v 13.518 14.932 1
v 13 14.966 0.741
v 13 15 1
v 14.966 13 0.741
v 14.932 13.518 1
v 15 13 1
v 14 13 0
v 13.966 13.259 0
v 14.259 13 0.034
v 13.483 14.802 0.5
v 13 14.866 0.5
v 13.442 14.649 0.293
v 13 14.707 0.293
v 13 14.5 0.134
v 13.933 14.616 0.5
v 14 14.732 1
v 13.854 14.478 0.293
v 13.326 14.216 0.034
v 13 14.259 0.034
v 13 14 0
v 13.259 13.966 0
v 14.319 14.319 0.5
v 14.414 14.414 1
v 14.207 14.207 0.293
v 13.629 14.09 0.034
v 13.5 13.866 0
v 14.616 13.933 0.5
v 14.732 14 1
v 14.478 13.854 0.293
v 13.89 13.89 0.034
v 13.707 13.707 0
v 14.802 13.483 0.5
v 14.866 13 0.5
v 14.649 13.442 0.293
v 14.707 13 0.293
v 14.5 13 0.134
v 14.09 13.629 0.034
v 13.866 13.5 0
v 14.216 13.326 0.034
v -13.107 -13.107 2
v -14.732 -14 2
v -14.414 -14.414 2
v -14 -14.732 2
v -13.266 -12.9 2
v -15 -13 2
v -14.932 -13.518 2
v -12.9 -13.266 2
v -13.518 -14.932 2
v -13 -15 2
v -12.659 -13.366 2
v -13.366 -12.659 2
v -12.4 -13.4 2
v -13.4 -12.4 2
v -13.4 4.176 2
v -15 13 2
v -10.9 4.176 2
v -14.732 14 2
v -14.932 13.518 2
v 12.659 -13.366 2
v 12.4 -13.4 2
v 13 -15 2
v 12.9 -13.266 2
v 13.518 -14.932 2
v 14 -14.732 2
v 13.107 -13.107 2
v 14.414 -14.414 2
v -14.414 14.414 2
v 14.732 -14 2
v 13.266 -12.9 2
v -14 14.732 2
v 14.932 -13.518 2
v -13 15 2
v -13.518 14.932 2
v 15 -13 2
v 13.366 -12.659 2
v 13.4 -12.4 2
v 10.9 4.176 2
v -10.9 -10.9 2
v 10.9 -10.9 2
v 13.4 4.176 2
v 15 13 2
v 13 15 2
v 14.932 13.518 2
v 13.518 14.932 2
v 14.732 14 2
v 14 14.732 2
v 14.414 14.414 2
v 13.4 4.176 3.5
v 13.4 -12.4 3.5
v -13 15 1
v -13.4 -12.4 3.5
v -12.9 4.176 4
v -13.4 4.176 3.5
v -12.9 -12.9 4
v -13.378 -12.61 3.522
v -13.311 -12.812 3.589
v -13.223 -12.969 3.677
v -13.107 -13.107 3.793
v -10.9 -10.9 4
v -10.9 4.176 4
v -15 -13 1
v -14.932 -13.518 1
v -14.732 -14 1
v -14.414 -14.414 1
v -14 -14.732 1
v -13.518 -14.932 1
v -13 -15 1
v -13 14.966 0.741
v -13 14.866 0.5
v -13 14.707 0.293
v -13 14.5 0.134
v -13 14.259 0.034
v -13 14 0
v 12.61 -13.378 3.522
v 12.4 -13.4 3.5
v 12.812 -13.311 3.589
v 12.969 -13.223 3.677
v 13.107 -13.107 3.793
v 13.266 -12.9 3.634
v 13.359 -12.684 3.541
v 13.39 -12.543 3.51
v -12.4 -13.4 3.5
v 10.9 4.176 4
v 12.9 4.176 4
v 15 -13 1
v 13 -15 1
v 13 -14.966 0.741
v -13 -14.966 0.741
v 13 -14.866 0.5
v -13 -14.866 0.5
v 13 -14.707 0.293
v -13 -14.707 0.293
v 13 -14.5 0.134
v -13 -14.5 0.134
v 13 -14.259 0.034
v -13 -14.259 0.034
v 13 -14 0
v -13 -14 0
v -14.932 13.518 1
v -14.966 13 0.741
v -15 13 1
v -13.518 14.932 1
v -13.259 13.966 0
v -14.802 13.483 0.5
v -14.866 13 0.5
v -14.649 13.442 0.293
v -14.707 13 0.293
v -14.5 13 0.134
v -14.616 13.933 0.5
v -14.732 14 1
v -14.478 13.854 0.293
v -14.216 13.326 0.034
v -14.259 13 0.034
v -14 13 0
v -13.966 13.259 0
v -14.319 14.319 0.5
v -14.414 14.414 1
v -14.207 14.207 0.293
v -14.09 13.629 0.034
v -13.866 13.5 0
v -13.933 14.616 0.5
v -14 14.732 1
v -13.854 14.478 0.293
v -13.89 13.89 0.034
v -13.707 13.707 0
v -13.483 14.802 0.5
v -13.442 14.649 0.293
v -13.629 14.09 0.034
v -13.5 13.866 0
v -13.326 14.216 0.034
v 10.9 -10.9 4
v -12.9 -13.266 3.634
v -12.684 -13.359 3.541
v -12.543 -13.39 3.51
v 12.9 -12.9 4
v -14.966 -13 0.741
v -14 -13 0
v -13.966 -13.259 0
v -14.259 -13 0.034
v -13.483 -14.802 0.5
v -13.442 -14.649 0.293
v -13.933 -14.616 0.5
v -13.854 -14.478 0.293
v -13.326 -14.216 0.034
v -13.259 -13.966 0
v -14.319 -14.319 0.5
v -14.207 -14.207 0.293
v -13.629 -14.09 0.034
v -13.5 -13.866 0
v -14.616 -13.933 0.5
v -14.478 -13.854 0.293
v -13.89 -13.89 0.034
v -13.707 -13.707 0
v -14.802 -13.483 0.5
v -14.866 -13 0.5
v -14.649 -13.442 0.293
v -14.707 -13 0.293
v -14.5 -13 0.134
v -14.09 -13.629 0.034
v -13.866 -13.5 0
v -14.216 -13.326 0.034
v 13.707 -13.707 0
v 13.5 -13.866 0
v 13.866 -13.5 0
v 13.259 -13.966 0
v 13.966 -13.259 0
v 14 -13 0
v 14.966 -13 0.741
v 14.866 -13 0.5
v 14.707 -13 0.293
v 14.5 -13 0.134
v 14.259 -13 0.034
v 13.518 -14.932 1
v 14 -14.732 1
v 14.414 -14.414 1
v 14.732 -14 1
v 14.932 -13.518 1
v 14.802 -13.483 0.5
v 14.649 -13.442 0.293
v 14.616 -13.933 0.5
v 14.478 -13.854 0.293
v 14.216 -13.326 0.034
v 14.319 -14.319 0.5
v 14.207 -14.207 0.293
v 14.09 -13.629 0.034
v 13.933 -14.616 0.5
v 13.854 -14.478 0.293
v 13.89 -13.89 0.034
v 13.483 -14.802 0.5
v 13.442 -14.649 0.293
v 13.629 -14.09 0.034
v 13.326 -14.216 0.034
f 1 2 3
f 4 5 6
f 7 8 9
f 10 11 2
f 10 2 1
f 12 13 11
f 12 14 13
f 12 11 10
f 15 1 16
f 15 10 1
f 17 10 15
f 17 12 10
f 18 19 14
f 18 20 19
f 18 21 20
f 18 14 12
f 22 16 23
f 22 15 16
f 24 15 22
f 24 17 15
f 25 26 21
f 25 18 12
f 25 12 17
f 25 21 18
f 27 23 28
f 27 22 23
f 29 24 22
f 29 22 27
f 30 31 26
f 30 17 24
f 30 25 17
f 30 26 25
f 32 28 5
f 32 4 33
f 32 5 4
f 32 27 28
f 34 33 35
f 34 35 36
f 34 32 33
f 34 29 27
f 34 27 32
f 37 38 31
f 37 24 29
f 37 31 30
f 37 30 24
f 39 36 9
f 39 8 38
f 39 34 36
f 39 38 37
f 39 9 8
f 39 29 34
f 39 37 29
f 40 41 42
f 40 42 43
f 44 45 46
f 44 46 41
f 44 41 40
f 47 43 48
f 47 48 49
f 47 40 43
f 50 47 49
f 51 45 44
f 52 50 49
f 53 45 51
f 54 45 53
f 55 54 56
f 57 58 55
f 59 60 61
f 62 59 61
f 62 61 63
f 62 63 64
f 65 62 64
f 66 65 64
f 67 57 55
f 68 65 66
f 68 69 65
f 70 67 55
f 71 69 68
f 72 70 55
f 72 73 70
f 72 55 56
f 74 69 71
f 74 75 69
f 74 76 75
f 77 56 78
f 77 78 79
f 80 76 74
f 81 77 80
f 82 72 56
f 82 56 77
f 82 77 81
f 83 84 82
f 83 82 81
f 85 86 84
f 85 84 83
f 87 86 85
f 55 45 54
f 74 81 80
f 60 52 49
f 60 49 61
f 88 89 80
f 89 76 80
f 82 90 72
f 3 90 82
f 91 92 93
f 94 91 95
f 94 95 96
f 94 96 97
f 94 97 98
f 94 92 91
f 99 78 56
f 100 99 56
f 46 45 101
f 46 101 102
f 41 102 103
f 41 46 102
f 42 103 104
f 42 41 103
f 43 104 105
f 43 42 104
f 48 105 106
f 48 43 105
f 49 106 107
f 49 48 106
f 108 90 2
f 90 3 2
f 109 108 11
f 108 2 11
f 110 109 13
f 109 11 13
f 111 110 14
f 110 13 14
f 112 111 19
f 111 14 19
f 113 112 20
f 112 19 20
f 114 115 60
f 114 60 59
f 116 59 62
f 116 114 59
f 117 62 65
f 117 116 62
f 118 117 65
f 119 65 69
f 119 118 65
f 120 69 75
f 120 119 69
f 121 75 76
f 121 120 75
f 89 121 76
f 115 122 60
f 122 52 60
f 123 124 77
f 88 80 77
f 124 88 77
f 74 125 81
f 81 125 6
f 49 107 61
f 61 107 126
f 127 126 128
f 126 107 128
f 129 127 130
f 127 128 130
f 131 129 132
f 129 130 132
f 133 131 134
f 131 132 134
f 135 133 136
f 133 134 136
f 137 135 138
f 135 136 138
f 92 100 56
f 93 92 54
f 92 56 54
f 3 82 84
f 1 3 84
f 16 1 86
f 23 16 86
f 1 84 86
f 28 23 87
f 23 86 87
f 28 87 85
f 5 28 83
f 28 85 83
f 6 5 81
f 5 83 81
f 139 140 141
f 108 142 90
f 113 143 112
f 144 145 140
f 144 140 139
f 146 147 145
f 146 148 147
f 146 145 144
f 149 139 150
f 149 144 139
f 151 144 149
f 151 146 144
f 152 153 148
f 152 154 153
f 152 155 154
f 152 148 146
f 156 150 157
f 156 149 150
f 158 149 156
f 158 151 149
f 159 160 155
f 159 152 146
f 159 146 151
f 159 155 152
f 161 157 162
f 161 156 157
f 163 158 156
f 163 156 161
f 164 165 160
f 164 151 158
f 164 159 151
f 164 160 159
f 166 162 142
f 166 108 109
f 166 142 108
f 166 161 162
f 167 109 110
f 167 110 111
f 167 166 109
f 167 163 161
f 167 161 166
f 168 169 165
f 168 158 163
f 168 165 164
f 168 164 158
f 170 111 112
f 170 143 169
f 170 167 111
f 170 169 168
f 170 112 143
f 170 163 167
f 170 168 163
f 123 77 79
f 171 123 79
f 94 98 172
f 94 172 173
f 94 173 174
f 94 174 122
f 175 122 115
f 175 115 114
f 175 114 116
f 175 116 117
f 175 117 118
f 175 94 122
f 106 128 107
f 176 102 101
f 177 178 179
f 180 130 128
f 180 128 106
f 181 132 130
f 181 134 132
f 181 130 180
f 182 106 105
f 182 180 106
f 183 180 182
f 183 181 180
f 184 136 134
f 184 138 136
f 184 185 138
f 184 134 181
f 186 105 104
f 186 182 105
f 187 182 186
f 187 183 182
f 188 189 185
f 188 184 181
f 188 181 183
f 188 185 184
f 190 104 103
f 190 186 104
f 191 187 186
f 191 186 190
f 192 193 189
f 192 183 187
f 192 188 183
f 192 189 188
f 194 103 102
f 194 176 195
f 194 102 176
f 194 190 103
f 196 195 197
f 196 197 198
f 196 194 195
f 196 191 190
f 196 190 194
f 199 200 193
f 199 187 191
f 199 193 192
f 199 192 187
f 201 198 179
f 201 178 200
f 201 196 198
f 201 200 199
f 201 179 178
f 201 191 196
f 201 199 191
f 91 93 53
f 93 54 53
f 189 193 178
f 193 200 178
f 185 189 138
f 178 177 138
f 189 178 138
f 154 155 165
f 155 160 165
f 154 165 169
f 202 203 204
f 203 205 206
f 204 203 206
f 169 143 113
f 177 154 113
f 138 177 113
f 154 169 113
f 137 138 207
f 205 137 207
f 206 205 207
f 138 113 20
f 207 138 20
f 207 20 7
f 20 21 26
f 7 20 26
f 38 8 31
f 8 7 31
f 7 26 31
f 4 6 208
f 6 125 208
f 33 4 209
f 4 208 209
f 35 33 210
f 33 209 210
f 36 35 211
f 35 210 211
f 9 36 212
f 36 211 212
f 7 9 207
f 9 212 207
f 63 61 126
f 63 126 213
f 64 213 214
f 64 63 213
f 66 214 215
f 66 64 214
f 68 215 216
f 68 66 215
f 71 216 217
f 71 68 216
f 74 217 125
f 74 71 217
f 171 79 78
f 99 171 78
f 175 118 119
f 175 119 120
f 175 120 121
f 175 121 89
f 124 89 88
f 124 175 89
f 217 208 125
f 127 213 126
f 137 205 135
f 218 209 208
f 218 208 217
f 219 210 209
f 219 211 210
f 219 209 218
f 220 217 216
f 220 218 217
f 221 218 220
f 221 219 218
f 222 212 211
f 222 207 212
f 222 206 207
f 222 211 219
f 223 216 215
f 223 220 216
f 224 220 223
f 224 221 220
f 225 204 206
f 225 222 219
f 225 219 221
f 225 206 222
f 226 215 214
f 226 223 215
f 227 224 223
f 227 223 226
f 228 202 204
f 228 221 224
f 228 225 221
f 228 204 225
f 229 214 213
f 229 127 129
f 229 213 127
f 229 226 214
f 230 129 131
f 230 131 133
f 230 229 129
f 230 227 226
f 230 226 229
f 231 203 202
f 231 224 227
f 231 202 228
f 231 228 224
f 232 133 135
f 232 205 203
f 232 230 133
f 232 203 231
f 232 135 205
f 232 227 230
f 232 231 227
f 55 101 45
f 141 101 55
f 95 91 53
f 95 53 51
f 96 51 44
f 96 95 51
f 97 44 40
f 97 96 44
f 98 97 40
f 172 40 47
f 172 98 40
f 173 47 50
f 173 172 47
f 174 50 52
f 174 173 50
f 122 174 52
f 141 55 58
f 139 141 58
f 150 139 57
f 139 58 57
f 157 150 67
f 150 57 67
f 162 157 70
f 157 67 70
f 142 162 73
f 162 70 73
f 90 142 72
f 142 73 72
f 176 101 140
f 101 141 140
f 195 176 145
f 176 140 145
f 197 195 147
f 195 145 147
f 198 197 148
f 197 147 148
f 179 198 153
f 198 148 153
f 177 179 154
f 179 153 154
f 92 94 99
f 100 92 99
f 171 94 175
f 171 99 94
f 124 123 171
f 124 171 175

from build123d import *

# Parameters (mm, degrees)
F0_W     = 30
F0_H     = 30
F1_DEPTH = 2
F2_DEPTH = 4
F3_R     = 2
F4_SIZE  = 0.5
F5_R     = 1
F6_R     = 1


with BuildPart() as f1:
    # F0 (on Top) → F1 (new body)
    with BuildSketch(Plane.XY):
        Rectangle(F0_W, F0_H)
        Polygon((-13.4, 13.4), (13.4, 13.4), (13.4, 4.1756560095), (13.4, -13.4), (-13.4, -13.4), (-13.4, 4.1756560095), align=None, mode=Mode.SUBTRACT)
        Polygon((13.4, 4.1756560095), (13.4, 13.4), (-13.4, 13.4), (-13.4, 4.1756560095), (-10.9, 4.1756560095), (-10.9, -10.9), (10.9, -10.9), (10.9, 4.1756560095), align=None)
        Polygon((13.4, -13.4), (13.4, 4.1756560095), (10.9, 4.1756560095), (10.9, -10.9), (-10.9, -10.9), (-10.9, 4.1756560095), (-13.4, 4.1756560095), (-13.4, -13.4), align=None)
    extrude(amount=F1_DEPTH)

    # F0 (on Top) → F2 (join)
    with BuildSketch(Plane.XY):
        Polygon((13.4, -13.4), (13.4, 4.1756560095), (10.9, 4.1756560095), (10.9, -10.9), (-10.9, -10.9), (-10.9, 4.1756560095), (-13.4, 4.1756560095), (-13.4, -13.4), align=None)
    extrude(amount=F2_DEPTH)

    # F3
    f3_edges = [f1.edges().sort_by_distance(p)[0] for p in [
        (-15, -15, 1),
        (-15, 15, 1),
        (15, 15, 1),
        (15, -15, 1),
    ]]
    fillet(f3_edges, radius=F3_R)

    # F4
    f4_edges = [f1.edges().sort_by_distance(p)[0] for p in [
        (13.4, -4.612172, 4),
        (0, -13.4, 4),
        (-13.4, -4.612172, 4),
    ]]
    chamfer(f4_edges, length=F4_SIZE)

    # F5
    f5_edges = [f1.edges().sort_by_distance(p)[0] for p in [
        (0, 15, 0),
    ]]
    fillet(f5_edges, radius=F5_R)

    # F6
    f6_edges = [f1.edges().sort_by_distance(p)[0] for p in [
        (13.4, -13.4, 2.75),
        (-13.4, -13.4, 2.75),
    ]]
    fillet(f6_edges, radius=F6_R)


solid = f1.part
